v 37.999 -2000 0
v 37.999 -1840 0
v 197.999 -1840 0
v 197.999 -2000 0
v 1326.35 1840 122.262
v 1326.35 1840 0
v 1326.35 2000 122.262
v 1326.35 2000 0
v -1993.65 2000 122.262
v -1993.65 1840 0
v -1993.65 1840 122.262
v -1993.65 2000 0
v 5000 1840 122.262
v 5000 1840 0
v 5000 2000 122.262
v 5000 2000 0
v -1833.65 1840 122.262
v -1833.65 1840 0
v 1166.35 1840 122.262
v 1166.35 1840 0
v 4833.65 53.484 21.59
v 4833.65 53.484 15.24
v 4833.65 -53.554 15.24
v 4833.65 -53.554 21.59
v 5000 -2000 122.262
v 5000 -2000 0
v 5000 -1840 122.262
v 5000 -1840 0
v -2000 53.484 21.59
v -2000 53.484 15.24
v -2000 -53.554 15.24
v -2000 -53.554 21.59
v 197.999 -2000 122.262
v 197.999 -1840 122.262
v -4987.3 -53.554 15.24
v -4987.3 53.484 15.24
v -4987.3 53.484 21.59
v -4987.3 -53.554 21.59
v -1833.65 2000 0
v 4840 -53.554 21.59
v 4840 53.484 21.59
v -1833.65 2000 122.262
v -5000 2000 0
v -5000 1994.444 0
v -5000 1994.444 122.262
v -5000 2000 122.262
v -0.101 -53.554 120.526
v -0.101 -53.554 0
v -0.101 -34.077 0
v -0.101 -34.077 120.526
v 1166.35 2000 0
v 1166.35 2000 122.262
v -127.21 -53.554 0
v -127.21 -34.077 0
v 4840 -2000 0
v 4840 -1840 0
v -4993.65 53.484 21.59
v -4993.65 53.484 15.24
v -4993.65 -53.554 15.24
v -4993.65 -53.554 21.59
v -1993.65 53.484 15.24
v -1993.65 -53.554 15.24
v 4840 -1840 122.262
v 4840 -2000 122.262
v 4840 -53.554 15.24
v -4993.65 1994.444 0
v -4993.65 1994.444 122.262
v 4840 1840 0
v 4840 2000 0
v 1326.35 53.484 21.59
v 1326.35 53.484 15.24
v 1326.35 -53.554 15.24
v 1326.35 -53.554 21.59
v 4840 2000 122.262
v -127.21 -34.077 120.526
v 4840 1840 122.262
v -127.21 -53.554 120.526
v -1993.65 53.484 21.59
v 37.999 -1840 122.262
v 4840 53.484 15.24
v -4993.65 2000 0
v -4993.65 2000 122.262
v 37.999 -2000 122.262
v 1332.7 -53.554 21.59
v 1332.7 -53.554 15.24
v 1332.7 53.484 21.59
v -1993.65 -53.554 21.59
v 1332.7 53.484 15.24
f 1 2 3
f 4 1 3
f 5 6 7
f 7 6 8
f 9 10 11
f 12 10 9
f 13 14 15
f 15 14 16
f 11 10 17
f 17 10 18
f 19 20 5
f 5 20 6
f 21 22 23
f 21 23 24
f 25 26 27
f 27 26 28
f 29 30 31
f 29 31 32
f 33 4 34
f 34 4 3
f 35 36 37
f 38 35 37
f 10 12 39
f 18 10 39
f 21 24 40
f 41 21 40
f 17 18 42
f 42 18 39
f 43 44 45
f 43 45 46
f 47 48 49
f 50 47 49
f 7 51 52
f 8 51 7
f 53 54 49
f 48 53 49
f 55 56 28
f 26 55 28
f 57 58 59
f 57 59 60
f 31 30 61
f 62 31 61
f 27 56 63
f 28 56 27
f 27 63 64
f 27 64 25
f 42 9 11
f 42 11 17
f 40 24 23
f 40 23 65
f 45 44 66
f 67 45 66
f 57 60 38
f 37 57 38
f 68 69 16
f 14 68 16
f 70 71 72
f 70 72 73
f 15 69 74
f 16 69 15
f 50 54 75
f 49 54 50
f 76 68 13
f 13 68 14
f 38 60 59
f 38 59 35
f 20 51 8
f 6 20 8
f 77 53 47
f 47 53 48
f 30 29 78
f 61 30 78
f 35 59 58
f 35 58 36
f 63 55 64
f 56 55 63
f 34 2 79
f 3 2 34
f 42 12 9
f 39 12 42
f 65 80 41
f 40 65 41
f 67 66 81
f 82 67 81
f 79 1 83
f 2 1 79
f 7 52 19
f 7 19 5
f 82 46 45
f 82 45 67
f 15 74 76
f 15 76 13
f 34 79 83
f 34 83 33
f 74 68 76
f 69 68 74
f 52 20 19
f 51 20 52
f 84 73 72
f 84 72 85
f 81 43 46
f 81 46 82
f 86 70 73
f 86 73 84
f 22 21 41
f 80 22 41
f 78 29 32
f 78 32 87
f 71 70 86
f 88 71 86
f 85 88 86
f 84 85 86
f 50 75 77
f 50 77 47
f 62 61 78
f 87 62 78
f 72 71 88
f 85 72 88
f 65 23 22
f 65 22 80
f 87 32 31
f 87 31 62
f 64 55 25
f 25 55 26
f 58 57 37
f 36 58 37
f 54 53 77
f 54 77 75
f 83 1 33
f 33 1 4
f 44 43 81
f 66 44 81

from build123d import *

# Parameters (mm, degrees)
F1_W     = 127.109468
F1_H     = 19.476443
F2_DEPTH = 120.525941
F3_W     = 6.35
F3_H     = 5.556254
F3_W_2   = 160
F3_H_2   = 160
F4_DEPTH = 122.261874
F5_W     = 6.35
F5_H     = 6.35
F6_DEPTH = 107.03823


with BuildPart() as f2:
    # F1 (on Top) → F2 (new body)
    with BuildSketch(Plane.XY):
        with Locations((-63.655466, -43.815508)):
            Rectangle(F1_W, F1_H)
    extrude(amount=F2_DEPTH)


with BuildPart() as f4:
    # F3 (on Top) → F4 (new body)
    with BuildSketch(Plane.XY):
        with Locations((-4996.825, 1997.221873)):
            Rectangle(F3_W, F3_H)
        with Locations((-1913.65, 1920)):
            Rectangle(F3_W_2, F3_H_2)
        with Locations((1246.35, 1920)):
            Rectangle(F3_W_2, F3_H_2)
        with Locations((4920, 1920)):
            Rectangle(F3_W_2, F3_H_2)
        with Locations((4920, -1920)):
            Rectangle(F3_W_2, F3_H_2)
        with Locations((117.999268, -1920)):
            Rectangle(F3_W_2, F3_H_2)
    extrude(amount=F4_DEPTH)


with BuildPart() as f6:
    # F5 (on face) → F6 (new body)
    with BuildSketch(Plane.XZ.offset(53.55373)):
        with Locations((4836.825, 18.415)):
            Rectangle(F5_W, F5_H)
        with Locations((1329.525, 18.415)):
            Rectangle(F5_W, F5_H)
        with Locations((-1996.825, 18.415)):
            Rectangle(F5_W, F5_H)
        with Locations((-4990.475, 18.415)):
            Rectangle(F5_W, F5_H)
    extrude(amount=-F6_DEPTH)


solid = Compound([f2.part, f4.part, f6.part])
